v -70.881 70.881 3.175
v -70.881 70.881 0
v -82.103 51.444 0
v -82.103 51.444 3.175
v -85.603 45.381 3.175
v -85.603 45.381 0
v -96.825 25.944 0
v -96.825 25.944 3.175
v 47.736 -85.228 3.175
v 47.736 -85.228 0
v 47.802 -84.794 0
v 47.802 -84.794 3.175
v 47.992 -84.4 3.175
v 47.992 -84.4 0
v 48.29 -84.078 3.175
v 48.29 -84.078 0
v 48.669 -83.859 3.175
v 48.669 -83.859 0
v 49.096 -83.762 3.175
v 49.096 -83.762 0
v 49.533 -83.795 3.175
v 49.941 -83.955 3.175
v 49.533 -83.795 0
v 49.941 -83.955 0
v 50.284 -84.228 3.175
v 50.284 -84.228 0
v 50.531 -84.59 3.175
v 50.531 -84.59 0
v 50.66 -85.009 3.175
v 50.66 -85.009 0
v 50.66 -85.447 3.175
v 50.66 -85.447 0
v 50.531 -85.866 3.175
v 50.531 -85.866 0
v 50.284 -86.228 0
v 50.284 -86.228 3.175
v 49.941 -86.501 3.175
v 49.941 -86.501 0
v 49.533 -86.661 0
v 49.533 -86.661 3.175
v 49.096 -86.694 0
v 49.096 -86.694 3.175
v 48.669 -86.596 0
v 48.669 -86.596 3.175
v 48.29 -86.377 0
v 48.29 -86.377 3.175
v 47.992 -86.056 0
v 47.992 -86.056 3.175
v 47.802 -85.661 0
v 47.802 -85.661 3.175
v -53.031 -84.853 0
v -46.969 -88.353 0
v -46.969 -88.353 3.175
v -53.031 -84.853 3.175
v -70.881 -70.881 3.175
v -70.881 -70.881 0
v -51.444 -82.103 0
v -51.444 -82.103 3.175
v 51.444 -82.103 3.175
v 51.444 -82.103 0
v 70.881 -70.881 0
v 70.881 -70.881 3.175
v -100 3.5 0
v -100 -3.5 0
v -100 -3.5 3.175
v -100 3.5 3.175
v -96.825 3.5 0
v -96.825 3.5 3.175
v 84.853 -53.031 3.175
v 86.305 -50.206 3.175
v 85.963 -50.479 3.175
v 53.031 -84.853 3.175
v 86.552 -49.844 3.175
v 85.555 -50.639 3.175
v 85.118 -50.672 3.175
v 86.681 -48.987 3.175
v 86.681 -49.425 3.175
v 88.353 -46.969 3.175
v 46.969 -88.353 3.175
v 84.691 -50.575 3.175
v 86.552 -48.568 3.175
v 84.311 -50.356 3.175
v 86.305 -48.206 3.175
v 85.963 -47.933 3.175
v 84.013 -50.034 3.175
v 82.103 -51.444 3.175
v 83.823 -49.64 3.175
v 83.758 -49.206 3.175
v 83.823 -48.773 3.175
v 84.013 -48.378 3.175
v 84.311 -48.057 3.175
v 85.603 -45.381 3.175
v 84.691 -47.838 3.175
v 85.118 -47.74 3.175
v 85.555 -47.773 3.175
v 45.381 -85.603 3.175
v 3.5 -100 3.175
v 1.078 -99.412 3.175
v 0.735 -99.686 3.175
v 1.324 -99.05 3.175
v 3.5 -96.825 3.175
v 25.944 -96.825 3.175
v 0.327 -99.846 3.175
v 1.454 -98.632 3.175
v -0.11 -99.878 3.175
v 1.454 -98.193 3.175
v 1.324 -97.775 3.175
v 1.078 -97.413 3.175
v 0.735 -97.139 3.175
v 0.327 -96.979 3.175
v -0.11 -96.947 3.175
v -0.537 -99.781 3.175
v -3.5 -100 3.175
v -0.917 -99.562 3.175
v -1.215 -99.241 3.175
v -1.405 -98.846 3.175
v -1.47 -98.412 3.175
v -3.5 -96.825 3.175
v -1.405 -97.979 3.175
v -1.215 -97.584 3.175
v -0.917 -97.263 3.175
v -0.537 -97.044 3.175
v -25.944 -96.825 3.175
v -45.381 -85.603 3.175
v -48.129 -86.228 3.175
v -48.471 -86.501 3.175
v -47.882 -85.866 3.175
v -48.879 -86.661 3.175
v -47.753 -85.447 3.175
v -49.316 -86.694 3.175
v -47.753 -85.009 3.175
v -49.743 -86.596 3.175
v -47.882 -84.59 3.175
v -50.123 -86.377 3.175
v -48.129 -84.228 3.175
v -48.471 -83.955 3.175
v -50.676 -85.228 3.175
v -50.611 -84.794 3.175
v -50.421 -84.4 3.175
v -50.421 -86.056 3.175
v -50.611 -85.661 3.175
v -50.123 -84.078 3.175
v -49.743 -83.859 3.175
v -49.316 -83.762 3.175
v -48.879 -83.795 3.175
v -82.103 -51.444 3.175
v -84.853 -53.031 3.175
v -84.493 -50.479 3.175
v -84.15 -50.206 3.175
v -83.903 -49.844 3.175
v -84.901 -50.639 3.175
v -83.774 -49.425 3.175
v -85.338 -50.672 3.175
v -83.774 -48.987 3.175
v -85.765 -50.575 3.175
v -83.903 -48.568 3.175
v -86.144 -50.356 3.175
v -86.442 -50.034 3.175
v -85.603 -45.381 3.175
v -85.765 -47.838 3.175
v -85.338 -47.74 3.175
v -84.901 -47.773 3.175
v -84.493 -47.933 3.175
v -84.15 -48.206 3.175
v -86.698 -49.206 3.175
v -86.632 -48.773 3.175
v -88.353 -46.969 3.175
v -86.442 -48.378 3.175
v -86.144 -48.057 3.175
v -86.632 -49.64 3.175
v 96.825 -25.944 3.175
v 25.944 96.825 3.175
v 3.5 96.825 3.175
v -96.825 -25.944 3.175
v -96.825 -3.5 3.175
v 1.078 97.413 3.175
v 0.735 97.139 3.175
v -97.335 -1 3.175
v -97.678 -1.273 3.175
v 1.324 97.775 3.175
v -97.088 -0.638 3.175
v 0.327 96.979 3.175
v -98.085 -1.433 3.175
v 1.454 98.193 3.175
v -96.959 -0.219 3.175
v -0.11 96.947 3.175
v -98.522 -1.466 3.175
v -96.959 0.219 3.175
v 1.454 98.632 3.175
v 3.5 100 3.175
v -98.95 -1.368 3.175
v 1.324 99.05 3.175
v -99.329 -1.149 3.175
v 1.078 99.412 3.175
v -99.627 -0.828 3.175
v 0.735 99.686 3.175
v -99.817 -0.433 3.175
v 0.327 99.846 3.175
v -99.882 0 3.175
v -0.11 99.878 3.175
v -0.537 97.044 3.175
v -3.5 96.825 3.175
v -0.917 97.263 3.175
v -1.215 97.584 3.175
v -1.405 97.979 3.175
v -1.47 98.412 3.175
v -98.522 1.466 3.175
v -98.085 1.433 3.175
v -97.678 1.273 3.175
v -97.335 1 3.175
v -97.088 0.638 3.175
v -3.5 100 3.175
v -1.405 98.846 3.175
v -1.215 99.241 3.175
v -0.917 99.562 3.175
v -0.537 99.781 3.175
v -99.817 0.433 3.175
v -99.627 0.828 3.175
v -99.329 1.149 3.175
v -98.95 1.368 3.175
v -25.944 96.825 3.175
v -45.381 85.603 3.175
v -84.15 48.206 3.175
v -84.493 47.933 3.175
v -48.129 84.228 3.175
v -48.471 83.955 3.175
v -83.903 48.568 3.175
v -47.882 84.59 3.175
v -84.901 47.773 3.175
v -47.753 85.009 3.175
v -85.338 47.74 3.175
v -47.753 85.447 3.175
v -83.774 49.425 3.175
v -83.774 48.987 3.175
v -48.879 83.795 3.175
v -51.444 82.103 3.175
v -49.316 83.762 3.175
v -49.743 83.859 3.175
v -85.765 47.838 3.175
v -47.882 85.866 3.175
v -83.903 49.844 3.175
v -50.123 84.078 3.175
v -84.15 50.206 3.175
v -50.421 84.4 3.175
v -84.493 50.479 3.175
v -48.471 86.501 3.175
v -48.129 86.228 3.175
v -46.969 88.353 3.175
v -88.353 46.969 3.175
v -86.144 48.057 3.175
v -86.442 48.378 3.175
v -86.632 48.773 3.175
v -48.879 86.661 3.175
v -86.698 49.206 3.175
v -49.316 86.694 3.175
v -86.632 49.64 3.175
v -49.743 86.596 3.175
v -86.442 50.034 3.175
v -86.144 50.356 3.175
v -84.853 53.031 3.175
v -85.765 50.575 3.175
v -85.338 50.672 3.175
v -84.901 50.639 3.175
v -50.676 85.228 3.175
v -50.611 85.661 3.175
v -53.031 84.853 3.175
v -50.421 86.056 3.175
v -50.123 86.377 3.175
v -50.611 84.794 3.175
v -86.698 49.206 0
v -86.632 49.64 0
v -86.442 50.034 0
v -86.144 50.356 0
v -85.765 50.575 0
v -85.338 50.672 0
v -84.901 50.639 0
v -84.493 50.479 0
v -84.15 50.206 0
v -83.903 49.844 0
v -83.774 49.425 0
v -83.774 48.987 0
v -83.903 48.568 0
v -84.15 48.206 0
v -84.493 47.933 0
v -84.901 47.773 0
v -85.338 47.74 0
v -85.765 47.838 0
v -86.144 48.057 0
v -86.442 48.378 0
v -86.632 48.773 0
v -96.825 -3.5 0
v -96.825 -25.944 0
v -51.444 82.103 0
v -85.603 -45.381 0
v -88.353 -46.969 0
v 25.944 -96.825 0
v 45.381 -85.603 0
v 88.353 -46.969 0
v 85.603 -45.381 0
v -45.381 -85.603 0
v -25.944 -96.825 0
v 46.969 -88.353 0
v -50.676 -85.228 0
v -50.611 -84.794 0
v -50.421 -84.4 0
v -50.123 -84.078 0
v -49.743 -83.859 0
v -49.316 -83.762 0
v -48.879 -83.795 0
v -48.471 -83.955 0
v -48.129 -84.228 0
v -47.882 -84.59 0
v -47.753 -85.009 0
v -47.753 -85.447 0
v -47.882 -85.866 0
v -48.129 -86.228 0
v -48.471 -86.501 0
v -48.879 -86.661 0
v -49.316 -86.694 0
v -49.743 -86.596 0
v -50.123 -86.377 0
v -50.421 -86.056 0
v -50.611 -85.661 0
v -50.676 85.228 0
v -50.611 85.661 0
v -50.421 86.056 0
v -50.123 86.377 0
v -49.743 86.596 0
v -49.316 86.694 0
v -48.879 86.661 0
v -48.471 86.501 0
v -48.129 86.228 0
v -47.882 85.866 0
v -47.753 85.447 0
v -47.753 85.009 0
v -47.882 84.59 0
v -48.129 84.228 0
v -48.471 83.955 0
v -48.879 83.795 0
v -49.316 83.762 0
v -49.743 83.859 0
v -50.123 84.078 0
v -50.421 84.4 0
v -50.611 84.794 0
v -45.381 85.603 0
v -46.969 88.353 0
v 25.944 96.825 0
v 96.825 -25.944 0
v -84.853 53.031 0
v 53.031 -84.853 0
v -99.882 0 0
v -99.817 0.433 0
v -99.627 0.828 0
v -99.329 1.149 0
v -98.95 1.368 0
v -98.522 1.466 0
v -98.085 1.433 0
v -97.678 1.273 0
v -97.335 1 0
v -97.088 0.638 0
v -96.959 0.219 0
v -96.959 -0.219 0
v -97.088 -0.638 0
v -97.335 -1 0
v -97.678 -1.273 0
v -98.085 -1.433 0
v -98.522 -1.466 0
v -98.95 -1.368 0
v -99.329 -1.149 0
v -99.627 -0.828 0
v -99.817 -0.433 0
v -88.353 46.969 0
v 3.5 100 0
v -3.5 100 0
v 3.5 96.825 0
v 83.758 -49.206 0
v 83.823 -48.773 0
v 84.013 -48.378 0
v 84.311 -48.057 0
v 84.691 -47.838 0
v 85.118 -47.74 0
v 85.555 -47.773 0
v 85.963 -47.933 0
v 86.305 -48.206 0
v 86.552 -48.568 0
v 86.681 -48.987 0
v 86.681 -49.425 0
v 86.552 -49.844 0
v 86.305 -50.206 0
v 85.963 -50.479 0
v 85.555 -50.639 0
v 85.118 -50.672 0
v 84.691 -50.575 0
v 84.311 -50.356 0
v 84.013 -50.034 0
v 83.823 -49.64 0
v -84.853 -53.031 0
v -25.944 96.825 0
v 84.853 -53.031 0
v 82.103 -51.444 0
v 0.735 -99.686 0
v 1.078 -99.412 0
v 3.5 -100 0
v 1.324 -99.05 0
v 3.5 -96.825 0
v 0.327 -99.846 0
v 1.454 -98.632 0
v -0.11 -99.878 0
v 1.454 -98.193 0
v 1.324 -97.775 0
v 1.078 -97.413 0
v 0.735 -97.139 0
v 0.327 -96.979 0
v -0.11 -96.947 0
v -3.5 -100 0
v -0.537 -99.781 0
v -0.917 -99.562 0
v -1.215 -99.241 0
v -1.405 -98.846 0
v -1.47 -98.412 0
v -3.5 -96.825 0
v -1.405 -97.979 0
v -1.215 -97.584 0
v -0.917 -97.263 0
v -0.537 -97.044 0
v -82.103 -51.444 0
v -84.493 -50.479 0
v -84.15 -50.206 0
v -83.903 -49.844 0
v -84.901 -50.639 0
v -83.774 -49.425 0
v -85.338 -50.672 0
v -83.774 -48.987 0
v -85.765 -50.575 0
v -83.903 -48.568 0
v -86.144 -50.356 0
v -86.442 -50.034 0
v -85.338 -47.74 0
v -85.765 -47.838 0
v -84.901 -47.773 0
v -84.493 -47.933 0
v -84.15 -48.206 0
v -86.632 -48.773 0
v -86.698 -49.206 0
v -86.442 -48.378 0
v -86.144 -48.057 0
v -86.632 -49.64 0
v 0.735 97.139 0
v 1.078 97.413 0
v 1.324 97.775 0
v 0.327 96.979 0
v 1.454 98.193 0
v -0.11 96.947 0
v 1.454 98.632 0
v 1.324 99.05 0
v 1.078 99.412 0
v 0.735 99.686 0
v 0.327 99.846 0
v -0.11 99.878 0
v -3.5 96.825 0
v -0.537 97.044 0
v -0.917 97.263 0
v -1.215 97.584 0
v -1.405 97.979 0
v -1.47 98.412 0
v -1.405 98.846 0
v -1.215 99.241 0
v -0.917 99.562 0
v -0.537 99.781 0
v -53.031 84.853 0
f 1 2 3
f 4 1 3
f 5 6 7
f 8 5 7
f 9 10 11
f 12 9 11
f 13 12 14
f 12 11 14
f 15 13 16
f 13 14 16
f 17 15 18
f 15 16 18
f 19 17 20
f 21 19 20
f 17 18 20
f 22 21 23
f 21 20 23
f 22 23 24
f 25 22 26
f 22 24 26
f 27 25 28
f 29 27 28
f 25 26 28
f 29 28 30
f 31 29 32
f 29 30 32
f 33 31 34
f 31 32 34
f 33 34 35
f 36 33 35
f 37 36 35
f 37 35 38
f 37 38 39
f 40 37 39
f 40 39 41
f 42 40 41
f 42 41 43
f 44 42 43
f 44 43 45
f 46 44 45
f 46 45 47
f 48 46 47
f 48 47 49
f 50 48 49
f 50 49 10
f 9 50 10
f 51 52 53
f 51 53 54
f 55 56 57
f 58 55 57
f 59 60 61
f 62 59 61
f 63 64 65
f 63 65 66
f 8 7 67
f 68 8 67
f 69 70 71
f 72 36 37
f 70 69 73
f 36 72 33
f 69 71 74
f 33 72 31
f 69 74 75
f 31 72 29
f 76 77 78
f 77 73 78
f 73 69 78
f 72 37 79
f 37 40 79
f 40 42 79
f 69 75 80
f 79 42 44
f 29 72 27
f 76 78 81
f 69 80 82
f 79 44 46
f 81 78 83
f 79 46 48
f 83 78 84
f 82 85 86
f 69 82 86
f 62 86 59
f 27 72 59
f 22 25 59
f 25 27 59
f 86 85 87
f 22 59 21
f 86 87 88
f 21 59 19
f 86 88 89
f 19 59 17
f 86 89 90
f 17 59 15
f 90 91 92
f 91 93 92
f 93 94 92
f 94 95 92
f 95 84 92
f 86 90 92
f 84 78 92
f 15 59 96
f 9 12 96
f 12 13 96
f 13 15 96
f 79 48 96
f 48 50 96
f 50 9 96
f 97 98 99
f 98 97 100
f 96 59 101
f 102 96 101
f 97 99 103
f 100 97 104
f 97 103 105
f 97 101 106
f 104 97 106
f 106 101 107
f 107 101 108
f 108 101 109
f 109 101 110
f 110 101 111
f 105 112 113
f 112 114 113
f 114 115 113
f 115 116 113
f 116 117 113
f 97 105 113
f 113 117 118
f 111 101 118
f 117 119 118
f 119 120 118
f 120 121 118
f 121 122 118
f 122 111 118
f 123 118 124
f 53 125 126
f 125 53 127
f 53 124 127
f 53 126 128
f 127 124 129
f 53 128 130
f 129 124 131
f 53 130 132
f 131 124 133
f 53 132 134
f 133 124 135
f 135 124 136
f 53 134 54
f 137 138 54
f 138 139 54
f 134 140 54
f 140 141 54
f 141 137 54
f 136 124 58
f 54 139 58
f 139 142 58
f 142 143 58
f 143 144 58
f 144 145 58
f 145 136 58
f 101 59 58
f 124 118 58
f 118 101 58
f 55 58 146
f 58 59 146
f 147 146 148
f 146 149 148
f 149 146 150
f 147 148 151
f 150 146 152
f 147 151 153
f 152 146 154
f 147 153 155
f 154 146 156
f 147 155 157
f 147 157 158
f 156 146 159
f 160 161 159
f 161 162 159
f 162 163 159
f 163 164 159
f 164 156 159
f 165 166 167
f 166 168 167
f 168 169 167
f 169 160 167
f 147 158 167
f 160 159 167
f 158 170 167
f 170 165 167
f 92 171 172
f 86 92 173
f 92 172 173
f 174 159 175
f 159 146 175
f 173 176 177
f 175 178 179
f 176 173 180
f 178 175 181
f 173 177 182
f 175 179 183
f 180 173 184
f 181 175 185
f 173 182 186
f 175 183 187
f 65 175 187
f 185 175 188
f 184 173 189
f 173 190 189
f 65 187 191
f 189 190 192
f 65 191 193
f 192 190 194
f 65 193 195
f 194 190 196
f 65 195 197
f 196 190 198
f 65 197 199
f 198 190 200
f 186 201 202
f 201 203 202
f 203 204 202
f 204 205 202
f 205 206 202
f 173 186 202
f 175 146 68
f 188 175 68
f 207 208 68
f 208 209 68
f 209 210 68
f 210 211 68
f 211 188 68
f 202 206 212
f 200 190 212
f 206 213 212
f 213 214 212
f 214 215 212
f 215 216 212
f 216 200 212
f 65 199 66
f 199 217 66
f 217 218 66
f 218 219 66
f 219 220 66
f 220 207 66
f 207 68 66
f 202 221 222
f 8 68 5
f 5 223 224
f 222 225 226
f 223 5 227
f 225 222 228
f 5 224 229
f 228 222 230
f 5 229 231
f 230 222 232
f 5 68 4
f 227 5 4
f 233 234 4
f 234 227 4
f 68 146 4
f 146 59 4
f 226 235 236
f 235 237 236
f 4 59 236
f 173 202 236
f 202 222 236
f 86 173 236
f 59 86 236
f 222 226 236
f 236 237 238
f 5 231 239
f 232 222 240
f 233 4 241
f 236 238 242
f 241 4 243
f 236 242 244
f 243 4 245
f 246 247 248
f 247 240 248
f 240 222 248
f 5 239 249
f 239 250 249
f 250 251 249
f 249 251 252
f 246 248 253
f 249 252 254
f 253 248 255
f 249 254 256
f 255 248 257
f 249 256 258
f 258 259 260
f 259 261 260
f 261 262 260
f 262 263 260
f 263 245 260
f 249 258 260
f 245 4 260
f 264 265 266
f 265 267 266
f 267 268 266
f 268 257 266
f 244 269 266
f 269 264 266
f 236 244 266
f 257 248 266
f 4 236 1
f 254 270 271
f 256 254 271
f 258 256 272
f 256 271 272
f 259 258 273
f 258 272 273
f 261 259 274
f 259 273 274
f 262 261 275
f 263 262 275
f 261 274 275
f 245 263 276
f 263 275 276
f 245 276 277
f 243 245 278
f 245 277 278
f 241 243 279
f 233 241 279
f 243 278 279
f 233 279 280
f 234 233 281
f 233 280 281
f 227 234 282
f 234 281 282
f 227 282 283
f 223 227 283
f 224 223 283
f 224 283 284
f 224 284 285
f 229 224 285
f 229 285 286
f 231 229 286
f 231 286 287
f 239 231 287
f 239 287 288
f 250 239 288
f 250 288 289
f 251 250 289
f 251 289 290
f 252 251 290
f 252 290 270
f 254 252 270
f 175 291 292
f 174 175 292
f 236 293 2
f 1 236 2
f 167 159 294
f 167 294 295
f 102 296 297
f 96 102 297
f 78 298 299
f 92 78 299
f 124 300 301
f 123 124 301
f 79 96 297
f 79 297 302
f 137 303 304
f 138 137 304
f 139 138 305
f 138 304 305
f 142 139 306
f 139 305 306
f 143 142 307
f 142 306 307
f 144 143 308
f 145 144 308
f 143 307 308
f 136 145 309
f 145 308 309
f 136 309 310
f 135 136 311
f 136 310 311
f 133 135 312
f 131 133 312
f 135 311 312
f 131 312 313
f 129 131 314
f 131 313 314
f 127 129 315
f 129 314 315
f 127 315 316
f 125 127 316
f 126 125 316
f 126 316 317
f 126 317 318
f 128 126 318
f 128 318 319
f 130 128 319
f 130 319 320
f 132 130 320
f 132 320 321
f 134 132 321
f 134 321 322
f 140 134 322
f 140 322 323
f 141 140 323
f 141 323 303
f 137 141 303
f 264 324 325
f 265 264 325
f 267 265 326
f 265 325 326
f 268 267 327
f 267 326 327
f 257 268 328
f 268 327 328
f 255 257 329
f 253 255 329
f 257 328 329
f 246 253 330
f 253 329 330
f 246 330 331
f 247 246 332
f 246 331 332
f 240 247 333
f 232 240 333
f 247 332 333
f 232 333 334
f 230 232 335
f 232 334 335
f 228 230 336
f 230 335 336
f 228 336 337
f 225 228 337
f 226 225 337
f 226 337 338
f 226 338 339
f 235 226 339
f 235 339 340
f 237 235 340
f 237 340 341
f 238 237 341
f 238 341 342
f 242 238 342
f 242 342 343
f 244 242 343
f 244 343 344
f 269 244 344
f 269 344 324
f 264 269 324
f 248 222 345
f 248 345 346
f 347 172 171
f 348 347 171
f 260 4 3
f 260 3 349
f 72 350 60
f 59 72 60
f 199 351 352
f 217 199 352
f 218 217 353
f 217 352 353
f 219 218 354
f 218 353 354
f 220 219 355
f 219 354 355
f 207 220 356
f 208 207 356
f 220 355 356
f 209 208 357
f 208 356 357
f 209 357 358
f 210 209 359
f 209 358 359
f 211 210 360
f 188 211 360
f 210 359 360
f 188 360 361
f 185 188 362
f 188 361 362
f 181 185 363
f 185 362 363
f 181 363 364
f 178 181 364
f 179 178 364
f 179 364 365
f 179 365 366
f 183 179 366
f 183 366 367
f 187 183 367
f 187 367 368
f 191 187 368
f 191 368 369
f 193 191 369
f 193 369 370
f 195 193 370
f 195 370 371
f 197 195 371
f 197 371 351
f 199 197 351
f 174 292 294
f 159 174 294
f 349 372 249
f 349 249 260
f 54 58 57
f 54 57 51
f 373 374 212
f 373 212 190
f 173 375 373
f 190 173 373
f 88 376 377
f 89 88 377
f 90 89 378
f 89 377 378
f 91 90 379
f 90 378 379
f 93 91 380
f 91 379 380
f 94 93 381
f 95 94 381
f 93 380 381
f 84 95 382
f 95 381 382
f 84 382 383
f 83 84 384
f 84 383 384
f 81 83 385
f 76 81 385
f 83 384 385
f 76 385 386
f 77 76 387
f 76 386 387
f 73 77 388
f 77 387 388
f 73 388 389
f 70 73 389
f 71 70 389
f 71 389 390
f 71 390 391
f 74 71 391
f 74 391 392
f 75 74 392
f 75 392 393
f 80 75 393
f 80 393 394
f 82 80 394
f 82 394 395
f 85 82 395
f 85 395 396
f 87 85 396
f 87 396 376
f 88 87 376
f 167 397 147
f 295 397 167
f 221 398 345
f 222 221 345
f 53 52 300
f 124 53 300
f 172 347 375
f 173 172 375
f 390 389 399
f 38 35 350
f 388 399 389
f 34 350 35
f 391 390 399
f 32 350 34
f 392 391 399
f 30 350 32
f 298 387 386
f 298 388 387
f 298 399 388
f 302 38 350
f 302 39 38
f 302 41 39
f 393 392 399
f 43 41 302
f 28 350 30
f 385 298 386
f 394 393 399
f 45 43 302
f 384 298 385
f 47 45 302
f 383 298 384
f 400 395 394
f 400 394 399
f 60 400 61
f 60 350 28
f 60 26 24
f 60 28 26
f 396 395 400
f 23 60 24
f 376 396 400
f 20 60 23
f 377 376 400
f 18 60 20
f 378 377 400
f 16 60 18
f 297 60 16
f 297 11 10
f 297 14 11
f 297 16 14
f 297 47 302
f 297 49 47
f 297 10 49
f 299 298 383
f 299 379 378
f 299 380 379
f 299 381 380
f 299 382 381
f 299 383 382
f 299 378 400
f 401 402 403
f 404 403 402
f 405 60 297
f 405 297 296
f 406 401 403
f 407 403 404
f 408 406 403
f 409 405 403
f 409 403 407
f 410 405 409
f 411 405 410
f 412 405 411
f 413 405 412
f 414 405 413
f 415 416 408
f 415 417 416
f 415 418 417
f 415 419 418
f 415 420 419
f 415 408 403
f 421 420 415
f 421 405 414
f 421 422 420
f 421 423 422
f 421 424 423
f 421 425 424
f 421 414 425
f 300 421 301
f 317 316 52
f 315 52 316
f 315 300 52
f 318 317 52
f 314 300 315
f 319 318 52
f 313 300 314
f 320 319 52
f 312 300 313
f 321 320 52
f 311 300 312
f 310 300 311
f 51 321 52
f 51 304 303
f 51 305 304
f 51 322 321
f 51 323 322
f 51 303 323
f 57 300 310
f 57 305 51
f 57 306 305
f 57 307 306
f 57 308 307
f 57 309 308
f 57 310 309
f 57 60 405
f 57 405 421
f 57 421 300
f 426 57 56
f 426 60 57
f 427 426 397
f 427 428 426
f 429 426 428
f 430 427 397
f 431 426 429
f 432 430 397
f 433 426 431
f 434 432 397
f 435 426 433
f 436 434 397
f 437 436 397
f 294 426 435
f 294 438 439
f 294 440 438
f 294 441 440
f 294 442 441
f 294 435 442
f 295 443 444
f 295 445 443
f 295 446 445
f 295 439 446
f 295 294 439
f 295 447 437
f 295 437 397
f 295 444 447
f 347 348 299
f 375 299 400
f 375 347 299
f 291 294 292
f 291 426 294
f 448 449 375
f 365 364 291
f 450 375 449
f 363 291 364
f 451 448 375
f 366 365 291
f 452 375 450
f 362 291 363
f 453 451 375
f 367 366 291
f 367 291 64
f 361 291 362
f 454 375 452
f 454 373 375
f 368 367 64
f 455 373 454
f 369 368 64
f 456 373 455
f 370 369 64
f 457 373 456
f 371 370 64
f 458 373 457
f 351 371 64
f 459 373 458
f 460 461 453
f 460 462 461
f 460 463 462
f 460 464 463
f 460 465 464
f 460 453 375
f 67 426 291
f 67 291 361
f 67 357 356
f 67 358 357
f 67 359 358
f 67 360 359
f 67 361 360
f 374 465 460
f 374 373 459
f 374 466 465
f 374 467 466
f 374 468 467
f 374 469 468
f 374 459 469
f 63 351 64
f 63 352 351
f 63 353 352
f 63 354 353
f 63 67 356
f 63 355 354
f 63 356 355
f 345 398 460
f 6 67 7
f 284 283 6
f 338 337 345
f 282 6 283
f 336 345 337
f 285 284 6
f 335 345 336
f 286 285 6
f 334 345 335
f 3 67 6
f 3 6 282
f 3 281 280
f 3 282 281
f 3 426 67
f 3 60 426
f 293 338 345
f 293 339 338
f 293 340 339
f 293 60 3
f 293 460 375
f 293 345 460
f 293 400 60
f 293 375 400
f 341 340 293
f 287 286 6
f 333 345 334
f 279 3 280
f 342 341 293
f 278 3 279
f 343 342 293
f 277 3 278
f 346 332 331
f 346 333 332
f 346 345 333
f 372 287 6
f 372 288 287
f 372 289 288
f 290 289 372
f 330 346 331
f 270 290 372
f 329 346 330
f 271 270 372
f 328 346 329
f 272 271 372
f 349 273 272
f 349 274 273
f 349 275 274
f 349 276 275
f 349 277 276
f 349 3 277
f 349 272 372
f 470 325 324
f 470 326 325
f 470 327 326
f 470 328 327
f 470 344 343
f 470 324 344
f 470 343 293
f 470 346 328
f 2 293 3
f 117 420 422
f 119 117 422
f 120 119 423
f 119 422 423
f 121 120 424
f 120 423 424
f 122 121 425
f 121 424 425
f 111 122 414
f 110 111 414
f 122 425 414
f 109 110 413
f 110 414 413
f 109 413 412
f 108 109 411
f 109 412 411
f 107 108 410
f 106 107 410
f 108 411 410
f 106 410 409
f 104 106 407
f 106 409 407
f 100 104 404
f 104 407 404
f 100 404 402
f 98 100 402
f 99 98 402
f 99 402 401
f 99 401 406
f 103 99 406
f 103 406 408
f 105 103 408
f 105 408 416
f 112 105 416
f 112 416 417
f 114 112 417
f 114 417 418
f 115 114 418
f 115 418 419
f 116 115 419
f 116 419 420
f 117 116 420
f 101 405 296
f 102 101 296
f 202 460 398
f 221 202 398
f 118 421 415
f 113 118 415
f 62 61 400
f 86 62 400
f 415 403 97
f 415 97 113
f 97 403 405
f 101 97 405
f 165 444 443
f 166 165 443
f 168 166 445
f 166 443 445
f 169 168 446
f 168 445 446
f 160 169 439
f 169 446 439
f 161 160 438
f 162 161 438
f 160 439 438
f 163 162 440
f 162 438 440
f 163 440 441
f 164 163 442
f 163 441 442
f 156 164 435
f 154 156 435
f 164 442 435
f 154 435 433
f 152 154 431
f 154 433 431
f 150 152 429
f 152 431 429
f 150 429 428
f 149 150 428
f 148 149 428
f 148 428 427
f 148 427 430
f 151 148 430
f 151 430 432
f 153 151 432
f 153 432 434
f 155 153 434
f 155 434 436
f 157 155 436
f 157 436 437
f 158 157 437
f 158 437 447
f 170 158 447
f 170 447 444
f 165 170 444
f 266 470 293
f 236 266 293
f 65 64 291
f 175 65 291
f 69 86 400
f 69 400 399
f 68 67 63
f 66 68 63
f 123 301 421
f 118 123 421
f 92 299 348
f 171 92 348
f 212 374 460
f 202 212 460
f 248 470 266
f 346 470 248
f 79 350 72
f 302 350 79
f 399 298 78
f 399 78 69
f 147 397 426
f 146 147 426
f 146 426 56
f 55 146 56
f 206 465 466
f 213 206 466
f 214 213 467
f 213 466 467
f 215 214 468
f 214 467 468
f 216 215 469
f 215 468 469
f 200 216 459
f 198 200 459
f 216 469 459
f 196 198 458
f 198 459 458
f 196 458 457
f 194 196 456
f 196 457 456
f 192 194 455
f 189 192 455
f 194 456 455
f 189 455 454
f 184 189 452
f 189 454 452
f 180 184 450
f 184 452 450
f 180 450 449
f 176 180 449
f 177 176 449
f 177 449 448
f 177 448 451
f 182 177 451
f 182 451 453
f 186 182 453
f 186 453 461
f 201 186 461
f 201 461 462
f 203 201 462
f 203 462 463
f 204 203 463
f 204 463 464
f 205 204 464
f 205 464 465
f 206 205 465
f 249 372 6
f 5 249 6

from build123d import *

# Parameters (mm, degrees)
BOSS_EXTRUDE1_DEPTH = 3.175
SKETCH3_R           = 1.47
CUT_EXTRUDE5_DEPTH  = 10
CUT_EXTRUDE6_DEPTH  = 10


with BuildPart() as part:
    # Sketch1 → Boss-Extrude1 (new body)
    with BuildSketch(Plane.XY):
        Polygon((-26.794919243, 100), (26.794919243, 100), (73.205080757, 73.205080757), (100, 26.794919243), (100, -26.794919243), (73.205080757, -73.205080757), (26.794919243, -100), (-26.794919243, -100), (-73.205080757, -73.205080757), (-100, -26.794919243), (-100, 26.794919243), (-73.205080757, 73.205080757), align=None)
    extrude(amount=BOSS_EXTRUDE1_DEPTH)

    # Sketch3 → Cut-Extrude5 (cut)
    with BuildSketch(Plane(origin=(0, 0, 0), x_dir=(-1, 0, 0), z_dir=(0, 0, -1))):
        Polygon((51.443588913, -82.102909721), (53.031088913, -84.852540378), (73.205080757, -73.205080757), (84.852540378, -53.031088913), (82.102909721, -51.443588913), (70.880819443, -70.880819443), align=None)
        Polygon((-26.794919243, -100), (-3.5, -100), (-3.5, -96.825), (-25.944180557, -96.825), (-45.381411087, -85.602909721), (-46.968911087, -88.352540378), align=None)
        Polygon((-73.205080757, -73.205080757), (-53.031088913, -84.852540378), (-51.443588913, -82.102909721), (-70.880819443, -70.880819443), (-82.102909721, -51.443588913), (-84.852540378, -53.031088913), align=None)
        with Locations((-49.20625, -85.22772505)):
            Circle(SKETCH3_R)
        Polygon((-100, -26.794919243), (-88.352540378, -46.968911087), (-85.602909721, -45.381411087), (-96.825, -25.944180557), (-96.825, -3.5), (-100, -3.5), align=None)
        Polygon((-100, 26.794919243), (-100, 3.5), (-96.825, 3.5), (-96.825, 25.944180557), (-85.602909721, 45.381411087), (-88.352540378, 46.968911087), align=None)
        Polygon((-26.794919243, 100), (-46.968911087, 88.352540378), (-45.381411087, 85.602909721), (-25.944180557, 96.825), (-3.5, 96.825), (-3.5, 100), align=None)
        Polygon((26.794919243, 100), (3.5, 100), (3.5, 96.825), (25.944180557, 96.825), (45.381411087, 85.602909721), (46.968911087, 88.352540378), align=None)
        Polygon((73.205080757, 73.205080757), (53.031088913, 84.852540378), (51.443588913, 82.102909721), (70.880819443, 70.880819443), (82.102909721, 51.443588913), (84.852540378, 53.031088913), align=None)
        with Locations((-85.22772505, 49.20625)):
            Circle(SKETCH3_R)
        with Locations((-49.20625, 85.22772505)):
            Circle(SKETCH3_R)
        with Locations((0, 98.4125)):
            Circle(SKETCH3_R)
        with Locations((49.20625, 85.22772505)):
            Circle(SKETCH3_R)
        with Locations((85.22772505, 49.20625)):
            Circle(SKETCH3_R)
        with Locations((98.4125, 0)):
            Circle(SKETCH3_R)
        Polygon((96.825, -3.5), (96.825, -25.944180557), (85.602909721, -45.381411087), (88.352540378, -46.968911087), (100, -26.794919243), (100, -3.5), align=None)
        with Locations((85.22772505, -49.20625)):
            Circle(SKETCH3_R)
        Polygon((45.381411087, -85.602909721), (25.944180557, -96.825), (3.5, -96.825), (3.5, -100), (26.794919243, -100), (46.968911087, -88.352540378), align=None)
        with Locations((0, -98.4125)):
            Circle(SKETCH3_R)
        with Locations((49.20625, -85.22772505)):
            Circle(SKETCH3_R)
        with Locations((-85.22772505, -49.20625)):
            Circle(SKETCH3_R)
        with Locations((-98.4125, 0)):
            Circle(SKETCH3_R)
        Polygon((-82.102909721, 51.443588913), (-70.880819443, 70.880819443), (-51.443588913, 82.102909721), (-53.031088913, 84.852540378), (-73.205080757, 73.205080757), (-84.852540378, 53.031088913), align=None)
        Polygon((100, 26.794919243), (88.352540378, 46.968911087), (85.602909721, 45.381411087), (96.825, 25.944180557), (96.825, 3.5), (100, 3.5), align=None)
    extrude(amount=-CUT_EXTRUDE5_DEPTH, mode=Mode.SUBTRACT)

    # Sketch4 → Cut-Extrude6 (cut)
    with BuildSketch(Plane.XY.offset(3.175)):
        Polygon((27.531680557, 99.574630657), (25.944180557, 96.825), (96.825, -25.944180557), (101.705845195, -25.944180557), (99.574630657, 27.531680557), (73.205080757, 73.205080757), align=None)
    extrude(amount=-CUT_EXTRUDE6_DEPTH, mode=Mode.SUBTRACT)


solid = part.part
